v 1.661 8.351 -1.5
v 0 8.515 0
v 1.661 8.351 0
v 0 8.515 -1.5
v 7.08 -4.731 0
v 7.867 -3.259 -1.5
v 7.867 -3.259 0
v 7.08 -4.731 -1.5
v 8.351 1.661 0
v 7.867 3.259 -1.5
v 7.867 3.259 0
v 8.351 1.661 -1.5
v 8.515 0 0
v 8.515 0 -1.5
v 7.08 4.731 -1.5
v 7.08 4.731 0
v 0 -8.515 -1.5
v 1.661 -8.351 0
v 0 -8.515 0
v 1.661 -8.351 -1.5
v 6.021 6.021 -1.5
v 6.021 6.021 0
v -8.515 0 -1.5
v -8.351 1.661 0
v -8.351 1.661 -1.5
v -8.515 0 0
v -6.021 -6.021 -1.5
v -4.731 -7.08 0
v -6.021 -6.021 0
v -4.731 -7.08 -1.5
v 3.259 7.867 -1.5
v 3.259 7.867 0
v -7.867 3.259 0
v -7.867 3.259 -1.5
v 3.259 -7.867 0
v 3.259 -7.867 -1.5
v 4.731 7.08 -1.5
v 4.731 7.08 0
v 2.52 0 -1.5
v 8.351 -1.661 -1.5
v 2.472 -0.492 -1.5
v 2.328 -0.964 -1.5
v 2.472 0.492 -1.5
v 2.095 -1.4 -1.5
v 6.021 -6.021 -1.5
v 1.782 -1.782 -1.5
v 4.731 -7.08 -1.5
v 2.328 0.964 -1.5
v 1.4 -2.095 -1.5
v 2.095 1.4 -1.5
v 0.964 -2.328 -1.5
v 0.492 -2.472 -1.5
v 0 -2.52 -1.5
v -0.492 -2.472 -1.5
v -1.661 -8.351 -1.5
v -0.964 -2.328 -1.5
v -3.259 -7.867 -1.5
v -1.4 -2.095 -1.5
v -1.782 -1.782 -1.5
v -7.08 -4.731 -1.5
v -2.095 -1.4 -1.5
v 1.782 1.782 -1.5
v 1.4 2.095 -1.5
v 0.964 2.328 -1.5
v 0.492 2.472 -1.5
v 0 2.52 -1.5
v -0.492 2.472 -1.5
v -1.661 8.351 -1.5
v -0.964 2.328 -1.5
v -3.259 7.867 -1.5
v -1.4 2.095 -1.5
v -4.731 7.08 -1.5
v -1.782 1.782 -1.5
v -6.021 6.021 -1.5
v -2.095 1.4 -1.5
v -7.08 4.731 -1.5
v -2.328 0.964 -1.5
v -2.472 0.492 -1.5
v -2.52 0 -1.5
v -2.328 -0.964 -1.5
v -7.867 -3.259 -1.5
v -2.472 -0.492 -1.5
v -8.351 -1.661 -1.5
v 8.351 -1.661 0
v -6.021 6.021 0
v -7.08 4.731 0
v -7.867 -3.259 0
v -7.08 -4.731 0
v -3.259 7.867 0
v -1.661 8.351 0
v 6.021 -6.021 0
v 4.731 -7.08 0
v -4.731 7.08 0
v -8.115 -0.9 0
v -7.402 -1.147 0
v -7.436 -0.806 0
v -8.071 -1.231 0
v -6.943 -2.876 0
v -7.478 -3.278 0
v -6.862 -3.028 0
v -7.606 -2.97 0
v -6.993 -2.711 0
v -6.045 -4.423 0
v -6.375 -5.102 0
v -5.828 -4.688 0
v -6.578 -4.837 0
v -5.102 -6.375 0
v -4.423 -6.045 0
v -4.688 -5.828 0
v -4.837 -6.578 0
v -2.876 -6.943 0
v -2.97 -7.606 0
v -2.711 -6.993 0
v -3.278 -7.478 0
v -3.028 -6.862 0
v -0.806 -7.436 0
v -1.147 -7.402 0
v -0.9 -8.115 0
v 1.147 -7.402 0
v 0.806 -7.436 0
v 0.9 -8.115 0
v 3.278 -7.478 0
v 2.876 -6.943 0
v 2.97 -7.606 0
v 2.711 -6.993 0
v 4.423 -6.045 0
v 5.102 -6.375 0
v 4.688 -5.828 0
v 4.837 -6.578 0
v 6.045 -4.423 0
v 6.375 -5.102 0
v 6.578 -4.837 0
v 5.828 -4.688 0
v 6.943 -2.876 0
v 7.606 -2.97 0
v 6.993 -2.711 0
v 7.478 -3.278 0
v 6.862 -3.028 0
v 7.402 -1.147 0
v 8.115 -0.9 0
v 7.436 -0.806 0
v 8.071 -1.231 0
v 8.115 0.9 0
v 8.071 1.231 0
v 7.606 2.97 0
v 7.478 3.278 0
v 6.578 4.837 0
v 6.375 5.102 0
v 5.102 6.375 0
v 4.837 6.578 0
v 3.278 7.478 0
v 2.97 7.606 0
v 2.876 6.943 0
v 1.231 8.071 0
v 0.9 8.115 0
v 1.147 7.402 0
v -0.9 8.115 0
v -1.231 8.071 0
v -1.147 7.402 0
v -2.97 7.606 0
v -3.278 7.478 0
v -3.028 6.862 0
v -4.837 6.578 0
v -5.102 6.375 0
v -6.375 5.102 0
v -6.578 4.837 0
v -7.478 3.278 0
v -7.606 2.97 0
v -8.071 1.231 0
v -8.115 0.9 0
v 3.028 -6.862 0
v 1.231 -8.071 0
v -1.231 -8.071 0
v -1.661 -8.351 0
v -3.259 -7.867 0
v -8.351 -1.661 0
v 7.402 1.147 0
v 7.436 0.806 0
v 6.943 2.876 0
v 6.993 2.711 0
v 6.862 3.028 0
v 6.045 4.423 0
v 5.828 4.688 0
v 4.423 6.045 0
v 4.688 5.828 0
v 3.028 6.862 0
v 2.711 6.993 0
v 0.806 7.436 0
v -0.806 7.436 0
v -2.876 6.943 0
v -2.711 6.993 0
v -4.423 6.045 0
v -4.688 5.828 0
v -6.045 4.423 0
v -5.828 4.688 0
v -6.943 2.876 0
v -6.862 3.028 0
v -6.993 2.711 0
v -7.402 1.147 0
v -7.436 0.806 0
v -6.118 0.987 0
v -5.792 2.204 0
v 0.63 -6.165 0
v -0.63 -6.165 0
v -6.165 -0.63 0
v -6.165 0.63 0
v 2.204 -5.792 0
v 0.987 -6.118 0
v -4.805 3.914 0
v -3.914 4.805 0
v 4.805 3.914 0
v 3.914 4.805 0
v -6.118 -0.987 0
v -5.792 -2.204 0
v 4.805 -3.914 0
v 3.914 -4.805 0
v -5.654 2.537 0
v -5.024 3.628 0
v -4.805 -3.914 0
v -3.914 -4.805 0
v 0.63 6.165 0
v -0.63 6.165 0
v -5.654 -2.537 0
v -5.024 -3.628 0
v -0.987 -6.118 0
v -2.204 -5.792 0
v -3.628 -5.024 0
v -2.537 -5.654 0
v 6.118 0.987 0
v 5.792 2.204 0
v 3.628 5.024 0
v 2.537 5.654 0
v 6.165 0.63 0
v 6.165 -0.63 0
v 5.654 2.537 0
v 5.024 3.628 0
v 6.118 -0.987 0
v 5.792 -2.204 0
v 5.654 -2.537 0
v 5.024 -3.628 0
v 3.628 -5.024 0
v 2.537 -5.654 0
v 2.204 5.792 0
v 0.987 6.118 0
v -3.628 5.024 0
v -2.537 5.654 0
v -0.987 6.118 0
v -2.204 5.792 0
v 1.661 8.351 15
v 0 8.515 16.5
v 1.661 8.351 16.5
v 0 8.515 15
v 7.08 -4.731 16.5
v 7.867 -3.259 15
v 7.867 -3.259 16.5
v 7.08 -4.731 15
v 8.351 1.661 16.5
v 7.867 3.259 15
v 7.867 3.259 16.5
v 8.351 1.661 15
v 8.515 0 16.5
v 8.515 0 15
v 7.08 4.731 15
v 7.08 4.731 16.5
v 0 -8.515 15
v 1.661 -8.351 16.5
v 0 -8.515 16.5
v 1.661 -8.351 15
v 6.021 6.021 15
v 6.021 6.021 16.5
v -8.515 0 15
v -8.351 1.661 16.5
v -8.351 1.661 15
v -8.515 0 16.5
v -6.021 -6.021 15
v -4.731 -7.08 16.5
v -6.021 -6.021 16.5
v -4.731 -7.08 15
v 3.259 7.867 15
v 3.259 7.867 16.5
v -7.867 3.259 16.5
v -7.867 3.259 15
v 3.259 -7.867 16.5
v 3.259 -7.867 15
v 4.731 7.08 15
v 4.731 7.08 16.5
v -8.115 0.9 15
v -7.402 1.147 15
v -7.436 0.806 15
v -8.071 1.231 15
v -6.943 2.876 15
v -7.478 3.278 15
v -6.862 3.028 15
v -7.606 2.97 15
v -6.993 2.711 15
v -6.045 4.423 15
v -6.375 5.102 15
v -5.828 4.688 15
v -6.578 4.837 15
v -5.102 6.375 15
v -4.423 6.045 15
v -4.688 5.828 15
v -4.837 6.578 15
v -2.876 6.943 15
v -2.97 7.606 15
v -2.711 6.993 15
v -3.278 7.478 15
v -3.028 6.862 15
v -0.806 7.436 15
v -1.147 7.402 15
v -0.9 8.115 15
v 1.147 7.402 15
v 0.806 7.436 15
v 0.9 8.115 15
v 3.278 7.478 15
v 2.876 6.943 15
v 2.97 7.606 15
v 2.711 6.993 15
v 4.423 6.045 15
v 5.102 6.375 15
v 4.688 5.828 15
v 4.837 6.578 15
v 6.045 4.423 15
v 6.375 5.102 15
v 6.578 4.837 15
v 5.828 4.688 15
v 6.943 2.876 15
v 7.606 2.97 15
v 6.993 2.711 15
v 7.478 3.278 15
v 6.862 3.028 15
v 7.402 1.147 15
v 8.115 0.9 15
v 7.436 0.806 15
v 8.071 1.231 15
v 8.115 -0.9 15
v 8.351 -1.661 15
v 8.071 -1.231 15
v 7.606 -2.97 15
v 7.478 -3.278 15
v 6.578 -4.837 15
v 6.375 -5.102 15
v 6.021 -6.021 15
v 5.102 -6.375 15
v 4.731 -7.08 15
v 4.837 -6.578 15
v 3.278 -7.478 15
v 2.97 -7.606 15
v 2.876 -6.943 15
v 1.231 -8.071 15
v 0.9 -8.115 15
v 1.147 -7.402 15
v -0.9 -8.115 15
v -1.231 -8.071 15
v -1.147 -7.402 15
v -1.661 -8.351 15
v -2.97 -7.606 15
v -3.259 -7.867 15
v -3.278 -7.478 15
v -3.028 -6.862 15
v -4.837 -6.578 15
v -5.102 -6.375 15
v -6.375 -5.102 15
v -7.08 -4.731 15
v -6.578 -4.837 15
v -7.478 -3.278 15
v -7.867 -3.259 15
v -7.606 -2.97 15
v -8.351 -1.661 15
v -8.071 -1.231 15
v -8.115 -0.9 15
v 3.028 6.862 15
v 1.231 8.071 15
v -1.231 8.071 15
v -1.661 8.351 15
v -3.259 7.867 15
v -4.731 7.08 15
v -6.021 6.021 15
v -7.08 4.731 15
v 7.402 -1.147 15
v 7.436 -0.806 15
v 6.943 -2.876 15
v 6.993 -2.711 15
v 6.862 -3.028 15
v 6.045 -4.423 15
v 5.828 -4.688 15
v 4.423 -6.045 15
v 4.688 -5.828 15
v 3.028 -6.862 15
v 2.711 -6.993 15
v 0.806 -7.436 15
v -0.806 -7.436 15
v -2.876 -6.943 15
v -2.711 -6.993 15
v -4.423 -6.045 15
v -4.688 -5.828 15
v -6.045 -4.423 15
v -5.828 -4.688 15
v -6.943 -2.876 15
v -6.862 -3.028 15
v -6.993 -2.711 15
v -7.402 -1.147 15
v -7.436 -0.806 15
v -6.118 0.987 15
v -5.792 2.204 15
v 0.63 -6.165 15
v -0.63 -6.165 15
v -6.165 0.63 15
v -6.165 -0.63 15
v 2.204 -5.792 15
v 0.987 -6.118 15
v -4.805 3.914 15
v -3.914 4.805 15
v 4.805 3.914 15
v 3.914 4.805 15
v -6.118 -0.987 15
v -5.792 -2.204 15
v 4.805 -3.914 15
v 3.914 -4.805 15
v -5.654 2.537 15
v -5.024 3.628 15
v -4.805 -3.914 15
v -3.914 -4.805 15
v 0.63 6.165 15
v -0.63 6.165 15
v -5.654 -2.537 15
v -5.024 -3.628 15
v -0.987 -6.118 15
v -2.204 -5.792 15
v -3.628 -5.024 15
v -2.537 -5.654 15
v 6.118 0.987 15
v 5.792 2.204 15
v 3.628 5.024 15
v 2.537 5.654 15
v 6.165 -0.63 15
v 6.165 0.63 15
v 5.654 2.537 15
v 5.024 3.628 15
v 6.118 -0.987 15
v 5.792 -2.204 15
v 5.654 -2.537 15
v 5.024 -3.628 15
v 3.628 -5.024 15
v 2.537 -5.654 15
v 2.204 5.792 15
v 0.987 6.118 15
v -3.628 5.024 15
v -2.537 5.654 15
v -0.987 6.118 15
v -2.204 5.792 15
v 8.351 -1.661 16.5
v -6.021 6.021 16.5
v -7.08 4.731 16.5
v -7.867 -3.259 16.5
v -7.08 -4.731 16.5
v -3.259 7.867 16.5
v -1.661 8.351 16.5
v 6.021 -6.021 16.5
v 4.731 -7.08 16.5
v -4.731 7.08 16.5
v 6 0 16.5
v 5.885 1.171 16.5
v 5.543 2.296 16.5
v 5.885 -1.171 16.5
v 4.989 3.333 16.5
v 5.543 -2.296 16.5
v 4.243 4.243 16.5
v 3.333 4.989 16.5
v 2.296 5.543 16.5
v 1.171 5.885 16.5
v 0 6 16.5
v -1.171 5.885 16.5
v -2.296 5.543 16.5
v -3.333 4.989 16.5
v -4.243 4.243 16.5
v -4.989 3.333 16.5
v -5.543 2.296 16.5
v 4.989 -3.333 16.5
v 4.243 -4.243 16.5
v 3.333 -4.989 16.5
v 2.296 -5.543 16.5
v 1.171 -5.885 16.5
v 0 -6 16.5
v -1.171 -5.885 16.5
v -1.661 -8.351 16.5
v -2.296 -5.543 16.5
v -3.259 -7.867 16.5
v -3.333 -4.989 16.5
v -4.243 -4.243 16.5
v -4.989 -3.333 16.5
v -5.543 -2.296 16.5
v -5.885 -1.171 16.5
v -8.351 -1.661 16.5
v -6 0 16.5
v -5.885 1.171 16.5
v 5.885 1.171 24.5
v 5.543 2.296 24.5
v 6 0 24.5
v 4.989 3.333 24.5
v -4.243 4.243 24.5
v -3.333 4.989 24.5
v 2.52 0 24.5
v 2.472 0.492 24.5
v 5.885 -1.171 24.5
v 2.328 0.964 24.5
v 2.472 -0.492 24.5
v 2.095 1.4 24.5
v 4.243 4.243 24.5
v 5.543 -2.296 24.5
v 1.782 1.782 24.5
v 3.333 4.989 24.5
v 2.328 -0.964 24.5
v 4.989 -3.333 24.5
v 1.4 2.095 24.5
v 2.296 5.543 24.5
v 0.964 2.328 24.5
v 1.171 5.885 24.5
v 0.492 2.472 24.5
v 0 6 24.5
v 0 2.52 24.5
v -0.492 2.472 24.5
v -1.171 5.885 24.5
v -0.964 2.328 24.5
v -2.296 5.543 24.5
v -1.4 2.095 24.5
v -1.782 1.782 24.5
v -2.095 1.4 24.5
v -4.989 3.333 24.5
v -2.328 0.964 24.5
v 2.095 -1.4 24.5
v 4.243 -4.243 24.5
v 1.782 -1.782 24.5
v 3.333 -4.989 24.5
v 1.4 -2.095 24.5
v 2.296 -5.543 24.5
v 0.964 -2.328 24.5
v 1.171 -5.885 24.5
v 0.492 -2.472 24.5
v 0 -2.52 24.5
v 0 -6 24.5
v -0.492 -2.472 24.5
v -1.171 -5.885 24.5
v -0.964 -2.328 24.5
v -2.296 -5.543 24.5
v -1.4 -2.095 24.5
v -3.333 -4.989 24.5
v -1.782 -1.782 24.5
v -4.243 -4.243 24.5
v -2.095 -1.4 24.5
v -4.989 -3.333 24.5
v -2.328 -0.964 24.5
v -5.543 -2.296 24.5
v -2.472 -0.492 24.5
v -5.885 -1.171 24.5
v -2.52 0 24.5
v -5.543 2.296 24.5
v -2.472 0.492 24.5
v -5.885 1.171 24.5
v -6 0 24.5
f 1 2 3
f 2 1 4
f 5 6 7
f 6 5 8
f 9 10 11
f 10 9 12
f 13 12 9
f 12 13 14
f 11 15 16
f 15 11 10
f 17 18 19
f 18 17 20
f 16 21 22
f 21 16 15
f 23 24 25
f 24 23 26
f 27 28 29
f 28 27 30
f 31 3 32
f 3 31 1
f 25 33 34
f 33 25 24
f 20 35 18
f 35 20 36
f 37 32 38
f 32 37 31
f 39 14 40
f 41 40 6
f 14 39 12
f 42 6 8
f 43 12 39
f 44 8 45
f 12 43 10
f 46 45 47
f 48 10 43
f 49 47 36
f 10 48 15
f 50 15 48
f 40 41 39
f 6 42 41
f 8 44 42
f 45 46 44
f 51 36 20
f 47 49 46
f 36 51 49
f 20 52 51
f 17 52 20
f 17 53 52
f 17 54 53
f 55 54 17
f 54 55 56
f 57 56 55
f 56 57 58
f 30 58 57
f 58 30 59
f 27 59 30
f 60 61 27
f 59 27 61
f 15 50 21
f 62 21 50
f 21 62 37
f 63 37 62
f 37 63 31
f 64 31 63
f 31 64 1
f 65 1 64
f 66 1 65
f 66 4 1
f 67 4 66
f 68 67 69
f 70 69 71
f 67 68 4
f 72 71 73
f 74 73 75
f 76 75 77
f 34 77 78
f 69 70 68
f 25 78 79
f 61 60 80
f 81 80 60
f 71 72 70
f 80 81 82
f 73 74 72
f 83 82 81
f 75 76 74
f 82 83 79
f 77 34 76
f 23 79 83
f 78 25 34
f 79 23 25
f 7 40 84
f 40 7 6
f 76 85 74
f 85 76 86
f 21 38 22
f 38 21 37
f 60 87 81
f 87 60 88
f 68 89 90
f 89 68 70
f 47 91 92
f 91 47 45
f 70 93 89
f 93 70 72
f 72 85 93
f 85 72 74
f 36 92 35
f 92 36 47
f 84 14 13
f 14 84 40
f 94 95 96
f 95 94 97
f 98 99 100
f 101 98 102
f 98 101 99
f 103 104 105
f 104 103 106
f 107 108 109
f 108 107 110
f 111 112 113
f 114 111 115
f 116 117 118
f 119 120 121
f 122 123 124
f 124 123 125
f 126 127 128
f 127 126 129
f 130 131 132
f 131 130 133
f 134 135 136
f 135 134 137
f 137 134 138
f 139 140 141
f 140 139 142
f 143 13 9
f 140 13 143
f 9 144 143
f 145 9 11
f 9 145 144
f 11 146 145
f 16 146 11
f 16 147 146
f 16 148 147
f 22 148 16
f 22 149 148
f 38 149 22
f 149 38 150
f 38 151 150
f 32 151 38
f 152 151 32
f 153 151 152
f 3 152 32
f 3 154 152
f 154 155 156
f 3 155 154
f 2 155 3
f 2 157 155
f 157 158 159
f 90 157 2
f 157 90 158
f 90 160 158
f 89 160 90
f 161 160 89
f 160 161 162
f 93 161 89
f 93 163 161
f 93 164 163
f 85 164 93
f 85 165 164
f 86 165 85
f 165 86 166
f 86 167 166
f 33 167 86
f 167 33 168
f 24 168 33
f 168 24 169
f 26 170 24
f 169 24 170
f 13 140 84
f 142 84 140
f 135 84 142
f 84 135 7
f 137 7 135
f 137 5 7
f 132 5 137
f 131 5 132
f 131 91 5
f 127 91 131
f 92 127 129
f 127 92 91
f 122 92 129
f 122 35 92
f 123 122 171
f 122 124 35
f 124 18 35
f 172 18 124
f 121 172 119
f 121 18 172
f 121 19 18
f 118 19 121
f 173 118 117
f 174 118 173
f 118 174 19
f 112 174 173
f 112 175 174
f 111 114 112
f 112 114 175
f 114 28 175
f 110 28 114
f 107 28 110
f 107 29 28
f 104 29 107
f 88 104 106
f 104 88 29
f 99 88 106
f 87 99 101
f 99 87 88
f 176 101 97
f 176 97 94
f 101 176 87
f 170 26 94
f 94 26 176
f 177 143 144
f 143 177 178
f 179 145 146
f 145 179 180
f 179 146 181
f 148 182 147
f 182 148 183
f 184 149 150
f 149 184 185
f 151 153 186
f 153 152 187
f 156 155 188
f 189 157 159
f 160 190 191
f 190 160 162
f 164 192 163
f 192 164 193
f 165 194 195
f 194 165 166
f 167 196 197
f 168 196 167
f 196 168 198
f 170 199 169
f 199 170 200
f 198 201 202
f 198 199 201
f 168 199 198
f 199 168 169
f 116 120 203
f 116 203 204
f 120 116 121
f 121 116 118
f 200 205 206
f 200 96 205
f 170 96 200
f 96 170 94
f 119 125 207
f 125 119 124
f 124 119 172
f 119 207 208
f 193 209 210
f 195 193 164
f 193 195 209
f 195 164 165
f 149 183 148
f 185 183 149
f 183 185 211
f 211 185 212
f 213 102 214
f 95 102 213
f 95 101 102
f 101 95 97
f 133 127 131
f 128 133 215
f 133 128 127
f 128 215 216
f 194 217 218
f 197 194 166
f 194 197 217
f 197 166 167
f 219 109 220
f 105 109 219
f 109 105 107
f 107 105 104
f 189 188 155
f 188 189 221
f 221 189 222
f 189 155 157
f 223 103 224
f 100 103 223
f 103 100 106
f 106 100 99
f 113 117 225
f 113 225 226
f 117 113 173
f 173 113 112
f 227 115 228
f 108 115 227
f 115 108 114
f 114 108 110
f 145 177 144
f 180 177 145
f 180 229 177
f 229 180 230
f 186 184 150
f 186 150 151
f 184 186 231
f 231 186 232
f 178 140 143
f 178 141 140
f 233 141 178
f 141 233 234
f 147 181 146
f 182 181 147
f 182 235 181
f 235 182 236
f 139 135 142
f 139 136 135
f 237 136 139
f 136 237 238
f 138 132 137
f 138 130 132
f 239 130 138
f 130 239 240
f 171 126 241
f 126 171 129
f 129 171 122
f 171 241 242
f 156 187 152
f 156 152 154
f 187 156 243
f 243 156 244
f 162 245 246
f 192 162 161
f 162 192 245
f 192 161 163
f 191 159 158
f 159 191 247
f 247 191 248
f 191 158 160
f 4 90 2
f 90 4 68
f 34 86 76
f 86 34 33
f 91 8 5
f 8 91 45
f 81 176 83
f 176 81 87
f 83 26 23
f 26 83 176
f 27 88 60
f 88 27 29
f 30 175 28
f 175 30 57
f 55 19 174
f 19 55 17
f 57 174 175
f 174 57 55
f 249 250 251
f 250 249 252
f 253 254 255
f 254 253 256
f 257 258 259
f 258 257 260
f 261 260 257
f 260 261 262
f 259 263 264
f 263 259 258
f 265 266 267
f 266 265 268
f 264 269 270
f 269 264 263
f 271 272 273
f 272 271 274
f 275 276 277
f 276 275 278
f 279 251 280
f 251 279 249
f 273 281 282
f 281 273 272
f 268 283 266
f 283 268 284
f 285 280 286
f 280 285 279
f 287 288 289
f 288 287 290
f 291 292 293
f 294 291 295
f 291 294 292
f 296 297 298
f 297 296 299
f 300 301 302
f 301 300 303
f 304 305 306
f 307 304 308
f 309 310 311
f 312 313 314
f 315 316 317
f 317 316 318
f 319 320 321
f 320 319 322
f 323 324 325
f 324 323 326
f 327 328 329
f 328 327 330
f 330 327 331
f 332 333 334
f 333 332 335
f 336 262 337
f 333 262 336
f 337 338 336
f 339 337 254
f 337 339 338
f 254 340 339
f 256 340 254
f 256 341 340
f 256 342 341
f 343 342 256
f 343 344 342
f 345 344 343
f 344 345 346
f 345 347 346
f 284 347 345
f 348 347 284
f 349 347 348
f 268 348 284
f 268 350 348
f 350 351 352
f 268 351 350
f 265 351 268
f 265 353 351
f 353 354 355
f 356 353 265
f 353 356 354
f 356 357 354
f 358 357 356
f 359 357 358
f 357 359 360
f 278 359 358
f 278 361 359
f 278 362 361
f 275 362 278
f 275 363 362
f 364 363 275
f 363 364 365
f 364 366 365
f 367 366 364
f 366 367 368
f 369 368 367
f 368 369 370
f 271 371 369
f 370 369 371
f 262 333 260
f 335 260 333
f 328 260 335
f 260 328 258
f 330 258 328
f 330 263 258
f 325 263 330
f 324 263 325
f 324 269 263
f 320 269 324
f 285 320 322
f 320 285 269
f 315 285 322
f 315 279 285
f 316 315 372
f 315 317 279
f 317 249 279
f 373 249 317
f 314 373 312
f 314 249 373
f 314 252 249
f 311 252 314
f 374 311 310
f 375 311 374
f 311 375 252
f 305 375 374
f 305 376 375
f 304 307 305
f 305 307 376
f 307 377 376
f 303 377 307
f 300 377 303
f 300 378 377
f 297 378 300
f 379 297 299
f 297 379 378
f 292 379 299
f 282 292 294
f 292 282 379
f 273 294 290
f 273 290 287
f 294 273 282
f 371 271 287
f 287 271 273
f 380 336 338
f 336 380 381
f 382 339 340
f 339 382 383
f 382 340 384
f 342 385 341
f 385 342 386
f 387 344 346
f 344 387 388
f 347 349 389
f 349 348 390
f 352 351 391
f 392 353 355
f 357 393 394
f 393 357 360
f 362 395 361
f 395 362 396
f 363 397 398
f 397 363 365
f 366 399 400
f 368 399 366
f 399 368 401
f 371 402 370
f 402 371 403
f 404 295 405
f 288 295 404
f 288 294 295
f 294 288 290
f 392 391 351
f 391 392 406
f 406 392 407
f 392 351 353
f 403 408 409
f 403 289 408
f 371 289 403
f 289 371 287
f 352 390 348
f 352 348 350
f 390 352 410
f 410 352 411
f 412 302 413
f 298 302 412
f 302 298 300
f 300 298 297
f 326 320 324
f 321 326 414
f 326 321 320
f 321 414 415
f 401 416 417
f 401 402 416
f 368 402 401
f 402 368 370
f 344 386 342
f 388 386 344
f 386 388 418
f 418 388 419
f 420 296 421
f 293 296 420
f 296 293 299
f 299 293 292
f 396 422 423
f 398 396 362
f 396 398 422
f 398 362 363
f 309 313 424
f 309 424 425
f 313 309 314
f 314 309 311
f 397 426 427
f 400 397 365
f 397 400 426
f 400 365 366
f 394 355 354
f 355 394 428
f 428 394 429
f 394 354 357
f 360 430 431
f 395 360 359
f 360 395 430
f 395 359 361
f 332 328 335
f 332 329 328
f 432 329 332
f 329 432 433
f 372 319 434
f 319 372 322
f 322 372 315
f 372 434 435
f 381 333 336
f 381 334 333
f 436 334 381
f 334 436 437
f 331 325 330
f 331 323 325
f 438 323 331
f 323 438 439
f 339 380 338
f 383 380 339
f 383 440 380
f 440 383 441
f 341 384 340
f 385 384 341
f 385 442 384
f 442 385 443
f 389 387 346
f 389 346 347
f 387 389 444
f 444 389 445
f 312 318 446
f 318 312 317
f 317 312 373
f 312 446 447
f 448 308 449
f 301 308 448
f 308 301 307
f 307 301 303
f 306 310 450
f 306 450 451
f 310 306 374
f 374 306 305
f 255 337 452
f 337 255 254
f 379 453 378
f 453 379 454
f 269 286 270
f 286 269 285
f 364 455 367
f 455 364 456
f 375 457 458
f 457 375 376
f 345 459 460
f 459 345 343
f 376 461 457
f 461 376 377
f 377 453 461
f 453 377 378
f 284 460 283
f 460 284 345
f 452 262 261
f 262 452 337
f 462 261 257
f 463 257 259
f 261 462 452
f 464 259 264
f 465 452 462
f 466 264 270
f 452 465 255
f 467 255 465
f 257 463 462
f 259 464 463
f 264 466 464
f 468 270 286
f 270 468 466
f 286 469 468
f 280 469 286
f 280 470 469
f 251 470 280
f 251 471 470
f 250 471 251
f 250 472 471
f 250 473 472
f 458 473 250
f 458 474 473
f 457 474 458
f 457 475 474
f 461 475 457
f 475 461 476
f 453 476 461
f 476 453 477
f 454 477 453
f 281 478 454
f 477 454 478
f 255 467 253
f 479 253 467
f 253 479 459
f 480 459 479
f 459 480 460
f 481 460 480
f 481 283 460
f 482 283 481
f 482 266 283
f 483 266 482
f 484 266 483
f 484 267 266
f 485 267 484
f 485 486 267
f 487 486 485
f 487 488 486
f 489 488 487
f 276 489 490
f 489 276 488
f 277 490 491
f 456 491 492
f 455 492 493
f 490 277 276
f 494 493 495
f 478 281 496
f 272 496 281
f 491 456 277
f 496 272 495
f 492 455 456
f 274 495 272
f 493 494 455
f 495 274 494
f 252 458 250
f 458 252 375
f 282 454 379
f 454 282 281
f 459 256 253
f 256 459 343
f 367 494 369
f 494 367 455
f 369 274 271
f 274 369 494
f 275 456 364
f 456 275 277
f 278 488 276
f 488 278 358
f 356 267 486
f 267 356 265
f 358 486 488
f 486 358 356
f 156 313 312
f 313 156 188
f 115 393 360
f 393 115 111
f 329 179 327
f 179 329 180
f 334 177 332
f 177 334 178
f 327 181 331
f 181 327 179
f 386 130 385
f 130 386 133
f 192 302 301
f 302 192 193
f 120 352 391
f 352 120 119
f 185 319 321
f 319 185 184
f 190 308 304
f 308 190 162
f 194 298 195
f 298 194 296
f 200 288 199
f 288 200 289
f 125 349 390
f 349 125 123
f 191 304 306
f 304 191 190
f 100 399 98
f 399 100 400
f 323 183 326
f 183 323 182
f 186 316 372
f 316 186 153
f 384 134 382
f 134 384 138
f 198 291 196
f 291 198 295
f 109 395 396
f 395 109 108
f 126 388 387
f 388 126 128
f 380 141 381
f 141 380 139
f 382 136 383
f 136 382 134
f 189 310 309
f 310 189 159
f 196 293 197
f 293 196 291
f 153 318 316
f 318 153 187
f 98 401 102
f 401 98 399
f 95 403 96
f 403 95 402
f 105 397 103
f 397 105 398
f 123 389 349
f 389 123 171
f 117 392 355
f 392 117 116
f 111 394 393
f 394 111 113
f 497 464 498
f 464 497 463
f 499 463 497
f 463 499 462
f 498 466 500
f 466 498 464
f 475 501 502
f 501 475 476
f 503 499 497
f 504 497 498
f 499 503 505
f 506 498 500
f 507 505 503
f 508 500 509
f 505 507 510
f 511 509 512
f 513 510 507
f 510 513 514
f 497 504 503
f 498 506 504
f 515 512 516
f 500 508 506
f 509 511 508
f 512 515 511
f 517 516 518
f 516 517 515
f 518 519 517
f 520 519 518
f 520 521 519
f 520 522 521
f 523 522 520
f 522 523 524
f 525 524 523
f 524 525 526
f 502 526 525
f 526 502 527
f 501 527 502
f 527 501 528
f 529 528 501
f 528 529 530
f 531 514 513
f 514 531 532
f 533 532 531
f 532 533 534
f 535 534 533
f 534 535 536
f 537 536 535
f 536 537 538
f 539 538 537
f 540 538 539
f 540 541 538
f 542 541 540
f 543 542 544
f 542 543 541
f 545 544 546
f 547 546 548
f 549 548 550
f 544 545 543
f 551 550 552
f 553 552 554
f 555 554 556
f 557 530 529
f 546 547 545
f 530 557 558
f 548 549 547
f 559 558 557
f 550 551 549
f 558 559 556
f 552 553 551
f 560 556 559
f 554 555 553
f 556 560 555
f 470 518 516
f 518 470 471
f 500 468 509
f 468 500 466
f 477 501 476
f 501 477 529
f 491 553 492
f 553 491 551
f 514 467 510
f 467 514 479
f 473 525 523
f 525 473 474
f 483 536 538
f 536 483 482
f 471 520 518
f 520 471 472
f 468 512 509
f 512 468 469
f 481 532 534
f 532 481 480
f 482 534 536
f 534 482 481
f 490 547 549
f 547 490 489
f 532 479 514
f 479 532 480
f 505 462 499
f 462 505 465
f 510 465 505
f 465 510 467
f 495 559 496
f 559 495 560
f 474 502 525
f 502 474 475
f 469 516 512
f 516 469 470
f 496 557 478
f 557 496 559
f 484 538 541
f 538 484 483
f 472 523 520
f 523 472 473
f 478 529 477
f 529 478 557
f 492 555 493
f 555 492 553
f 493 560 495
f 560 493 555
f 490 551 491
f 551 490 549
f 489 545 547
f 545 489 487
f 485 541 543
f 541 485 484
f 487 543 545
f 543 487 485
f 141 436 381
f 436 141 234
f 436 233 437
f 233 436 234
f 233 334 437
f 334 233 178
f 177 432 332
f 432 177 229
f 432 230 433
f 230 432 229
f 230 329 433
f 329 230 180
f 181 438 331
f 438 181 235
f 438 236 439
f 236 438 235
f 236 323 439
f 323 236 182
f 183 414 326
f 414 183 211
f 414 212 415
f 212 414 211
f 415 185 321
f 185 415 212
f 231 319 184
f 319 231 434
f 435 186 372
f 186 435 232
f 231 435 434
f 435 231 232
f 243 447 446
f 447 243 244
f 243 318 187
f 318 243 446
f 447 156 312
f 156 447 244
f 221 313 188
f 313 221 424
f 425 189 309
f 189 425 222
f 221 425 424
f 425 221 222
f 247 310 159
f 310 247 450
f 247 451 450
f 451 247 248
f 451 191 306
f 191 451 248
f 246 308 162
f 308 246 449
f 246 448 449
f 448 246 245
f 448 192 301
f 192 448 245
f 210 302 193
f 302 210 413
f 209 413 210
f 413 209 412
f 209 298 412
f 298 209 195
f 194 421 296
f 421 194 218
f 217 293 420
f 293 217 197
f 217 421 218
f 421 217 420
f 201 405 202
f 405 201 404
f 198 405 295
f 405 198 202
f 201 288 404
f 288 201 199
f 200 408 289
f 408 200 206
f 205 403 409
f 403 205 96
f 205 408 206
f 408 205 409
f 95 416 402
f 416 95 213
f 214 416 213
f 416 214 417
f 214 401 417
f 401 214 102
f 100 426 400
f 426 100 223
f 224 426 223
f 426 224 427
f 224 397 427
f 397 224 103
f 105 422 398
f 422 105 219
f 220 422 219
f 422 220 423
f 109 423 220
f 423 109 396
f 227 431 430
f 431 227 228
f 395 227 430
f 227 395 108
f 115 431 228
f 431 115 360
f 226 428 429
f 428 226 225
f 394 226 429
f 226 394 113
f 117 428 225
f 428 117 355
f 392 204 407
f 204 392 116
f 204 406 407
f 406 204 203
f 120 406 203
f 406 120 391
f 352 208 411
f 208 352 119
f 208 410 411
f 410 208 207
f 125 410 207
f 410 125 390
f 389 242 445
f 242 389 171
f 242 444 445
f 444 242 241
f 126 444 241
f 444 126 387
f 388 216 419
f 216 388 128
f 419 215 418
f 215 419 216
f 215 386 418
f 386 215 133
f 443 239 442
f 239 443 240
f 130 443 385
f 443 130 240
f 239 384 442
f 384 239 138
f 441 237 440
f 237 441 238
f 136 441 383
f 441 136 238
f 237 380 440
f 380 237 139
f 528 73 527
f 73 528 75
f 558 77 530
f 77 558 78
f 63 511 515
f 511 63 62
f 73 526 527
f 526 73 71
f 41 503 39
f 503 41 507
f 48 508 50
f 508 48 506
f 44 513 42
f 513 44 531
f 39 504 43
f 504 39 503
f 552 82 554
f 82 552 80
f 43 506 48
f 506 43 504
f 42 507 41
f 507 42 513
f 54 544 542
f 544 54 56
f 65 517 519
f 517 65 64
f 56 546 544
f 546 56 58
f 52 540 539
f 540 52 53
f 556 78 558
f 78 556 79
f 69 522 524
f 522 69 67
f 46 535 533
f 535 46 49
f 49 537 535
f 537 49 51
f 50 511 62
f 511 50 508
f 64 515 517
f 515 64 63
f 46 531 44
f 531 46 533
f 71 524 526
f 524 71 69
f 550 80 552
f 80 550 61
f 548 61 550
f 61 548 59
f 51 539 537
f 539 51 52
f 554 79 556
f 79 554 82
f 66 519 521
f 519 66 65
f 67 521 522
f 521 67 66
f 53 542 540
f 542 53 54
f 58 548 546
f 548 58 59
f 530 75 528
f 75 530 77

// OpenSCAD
$fn = 32;

// ----------------------------------------------------------------------
// Timing pulley: GT2 24T, pitch 2 mm, 17.03 mm x 26 mm
// ----------------------------------------------------------------------

// --- parameters (mm) ---
belt_pitch = 2;           // belt pitch
n_teeth = 24;             // number of grooves
rim_w = 15;               // belt width between the flanges
tip_d = 15.03;            // tip circle diameter
root_d = 13.53;           // groove bottom diameter
groove_h = 0.75;          // groove depth
tooth_w = 1.5;            // groove width at the tip circle
rim_d = 17.03;            // flange diameter
rim_t = 1.5;              // flange thickness
spigot_d = 11.93;         // flange spigot, sunk into the rim
spigot_h = 1.2;           // spigot depth into the rim
shaft_d = 5.04;           // shaft bore
hub_d = 12;               // hub diameter
hub_h = 8;                // hub above the flange
bottom_z = -1.5;          // lowest point of the pulley
top_z = 24.5;             // highest point of the pulley

module rim() {
  cylinder(h = rim_w, d = tip_d);
}

module groove_cutter() {
  /* belt tooth groove: deeper than wide, cut through the belt width */
  translate([root_d / 2, 0, 0])
    linear_extrude(height = rim_w)
      polygon(points = [[-0.6, -tooth_w * 0.42], [groove_h + 0.6, -tooth_w * 0.6],
                        [groove_h + 0.6, tooth_w * 0.6], [-0.6, tooth_w * 0.42]]);
}

module flanges() {
  translate([0, 0, -rim_t]) cylinder(h = rim_t, d = rim_d);
  translate([0, 0, rim_w]) cylinder(h = rim_t, d = rim_d);
  translate([0, 0, -spigot_h]) cylinder(h = spigot_h + 0.6, d = spigot_d);
  translate([0, 0, rim_w - 0.6]) cylinder(h = spigot_h + 0.6, d = spigot_d);
}

module hub() {
  translate([0, 0, bottom_z]) cylinder(h = top_z - bottom_z, d = hub_d);
}

difference() {
  union() {
    rim();
    hub();
    flanges();
  }
  for (i = [0 : n_teeth - 1]) rotate([0, 0, i * 360 / n_teeth]) groove_cutter();
  translate([0, 0, bottom_z - 1]) cylinder(h = top_z - bottom_z + 2, d = shaft_d);
}
